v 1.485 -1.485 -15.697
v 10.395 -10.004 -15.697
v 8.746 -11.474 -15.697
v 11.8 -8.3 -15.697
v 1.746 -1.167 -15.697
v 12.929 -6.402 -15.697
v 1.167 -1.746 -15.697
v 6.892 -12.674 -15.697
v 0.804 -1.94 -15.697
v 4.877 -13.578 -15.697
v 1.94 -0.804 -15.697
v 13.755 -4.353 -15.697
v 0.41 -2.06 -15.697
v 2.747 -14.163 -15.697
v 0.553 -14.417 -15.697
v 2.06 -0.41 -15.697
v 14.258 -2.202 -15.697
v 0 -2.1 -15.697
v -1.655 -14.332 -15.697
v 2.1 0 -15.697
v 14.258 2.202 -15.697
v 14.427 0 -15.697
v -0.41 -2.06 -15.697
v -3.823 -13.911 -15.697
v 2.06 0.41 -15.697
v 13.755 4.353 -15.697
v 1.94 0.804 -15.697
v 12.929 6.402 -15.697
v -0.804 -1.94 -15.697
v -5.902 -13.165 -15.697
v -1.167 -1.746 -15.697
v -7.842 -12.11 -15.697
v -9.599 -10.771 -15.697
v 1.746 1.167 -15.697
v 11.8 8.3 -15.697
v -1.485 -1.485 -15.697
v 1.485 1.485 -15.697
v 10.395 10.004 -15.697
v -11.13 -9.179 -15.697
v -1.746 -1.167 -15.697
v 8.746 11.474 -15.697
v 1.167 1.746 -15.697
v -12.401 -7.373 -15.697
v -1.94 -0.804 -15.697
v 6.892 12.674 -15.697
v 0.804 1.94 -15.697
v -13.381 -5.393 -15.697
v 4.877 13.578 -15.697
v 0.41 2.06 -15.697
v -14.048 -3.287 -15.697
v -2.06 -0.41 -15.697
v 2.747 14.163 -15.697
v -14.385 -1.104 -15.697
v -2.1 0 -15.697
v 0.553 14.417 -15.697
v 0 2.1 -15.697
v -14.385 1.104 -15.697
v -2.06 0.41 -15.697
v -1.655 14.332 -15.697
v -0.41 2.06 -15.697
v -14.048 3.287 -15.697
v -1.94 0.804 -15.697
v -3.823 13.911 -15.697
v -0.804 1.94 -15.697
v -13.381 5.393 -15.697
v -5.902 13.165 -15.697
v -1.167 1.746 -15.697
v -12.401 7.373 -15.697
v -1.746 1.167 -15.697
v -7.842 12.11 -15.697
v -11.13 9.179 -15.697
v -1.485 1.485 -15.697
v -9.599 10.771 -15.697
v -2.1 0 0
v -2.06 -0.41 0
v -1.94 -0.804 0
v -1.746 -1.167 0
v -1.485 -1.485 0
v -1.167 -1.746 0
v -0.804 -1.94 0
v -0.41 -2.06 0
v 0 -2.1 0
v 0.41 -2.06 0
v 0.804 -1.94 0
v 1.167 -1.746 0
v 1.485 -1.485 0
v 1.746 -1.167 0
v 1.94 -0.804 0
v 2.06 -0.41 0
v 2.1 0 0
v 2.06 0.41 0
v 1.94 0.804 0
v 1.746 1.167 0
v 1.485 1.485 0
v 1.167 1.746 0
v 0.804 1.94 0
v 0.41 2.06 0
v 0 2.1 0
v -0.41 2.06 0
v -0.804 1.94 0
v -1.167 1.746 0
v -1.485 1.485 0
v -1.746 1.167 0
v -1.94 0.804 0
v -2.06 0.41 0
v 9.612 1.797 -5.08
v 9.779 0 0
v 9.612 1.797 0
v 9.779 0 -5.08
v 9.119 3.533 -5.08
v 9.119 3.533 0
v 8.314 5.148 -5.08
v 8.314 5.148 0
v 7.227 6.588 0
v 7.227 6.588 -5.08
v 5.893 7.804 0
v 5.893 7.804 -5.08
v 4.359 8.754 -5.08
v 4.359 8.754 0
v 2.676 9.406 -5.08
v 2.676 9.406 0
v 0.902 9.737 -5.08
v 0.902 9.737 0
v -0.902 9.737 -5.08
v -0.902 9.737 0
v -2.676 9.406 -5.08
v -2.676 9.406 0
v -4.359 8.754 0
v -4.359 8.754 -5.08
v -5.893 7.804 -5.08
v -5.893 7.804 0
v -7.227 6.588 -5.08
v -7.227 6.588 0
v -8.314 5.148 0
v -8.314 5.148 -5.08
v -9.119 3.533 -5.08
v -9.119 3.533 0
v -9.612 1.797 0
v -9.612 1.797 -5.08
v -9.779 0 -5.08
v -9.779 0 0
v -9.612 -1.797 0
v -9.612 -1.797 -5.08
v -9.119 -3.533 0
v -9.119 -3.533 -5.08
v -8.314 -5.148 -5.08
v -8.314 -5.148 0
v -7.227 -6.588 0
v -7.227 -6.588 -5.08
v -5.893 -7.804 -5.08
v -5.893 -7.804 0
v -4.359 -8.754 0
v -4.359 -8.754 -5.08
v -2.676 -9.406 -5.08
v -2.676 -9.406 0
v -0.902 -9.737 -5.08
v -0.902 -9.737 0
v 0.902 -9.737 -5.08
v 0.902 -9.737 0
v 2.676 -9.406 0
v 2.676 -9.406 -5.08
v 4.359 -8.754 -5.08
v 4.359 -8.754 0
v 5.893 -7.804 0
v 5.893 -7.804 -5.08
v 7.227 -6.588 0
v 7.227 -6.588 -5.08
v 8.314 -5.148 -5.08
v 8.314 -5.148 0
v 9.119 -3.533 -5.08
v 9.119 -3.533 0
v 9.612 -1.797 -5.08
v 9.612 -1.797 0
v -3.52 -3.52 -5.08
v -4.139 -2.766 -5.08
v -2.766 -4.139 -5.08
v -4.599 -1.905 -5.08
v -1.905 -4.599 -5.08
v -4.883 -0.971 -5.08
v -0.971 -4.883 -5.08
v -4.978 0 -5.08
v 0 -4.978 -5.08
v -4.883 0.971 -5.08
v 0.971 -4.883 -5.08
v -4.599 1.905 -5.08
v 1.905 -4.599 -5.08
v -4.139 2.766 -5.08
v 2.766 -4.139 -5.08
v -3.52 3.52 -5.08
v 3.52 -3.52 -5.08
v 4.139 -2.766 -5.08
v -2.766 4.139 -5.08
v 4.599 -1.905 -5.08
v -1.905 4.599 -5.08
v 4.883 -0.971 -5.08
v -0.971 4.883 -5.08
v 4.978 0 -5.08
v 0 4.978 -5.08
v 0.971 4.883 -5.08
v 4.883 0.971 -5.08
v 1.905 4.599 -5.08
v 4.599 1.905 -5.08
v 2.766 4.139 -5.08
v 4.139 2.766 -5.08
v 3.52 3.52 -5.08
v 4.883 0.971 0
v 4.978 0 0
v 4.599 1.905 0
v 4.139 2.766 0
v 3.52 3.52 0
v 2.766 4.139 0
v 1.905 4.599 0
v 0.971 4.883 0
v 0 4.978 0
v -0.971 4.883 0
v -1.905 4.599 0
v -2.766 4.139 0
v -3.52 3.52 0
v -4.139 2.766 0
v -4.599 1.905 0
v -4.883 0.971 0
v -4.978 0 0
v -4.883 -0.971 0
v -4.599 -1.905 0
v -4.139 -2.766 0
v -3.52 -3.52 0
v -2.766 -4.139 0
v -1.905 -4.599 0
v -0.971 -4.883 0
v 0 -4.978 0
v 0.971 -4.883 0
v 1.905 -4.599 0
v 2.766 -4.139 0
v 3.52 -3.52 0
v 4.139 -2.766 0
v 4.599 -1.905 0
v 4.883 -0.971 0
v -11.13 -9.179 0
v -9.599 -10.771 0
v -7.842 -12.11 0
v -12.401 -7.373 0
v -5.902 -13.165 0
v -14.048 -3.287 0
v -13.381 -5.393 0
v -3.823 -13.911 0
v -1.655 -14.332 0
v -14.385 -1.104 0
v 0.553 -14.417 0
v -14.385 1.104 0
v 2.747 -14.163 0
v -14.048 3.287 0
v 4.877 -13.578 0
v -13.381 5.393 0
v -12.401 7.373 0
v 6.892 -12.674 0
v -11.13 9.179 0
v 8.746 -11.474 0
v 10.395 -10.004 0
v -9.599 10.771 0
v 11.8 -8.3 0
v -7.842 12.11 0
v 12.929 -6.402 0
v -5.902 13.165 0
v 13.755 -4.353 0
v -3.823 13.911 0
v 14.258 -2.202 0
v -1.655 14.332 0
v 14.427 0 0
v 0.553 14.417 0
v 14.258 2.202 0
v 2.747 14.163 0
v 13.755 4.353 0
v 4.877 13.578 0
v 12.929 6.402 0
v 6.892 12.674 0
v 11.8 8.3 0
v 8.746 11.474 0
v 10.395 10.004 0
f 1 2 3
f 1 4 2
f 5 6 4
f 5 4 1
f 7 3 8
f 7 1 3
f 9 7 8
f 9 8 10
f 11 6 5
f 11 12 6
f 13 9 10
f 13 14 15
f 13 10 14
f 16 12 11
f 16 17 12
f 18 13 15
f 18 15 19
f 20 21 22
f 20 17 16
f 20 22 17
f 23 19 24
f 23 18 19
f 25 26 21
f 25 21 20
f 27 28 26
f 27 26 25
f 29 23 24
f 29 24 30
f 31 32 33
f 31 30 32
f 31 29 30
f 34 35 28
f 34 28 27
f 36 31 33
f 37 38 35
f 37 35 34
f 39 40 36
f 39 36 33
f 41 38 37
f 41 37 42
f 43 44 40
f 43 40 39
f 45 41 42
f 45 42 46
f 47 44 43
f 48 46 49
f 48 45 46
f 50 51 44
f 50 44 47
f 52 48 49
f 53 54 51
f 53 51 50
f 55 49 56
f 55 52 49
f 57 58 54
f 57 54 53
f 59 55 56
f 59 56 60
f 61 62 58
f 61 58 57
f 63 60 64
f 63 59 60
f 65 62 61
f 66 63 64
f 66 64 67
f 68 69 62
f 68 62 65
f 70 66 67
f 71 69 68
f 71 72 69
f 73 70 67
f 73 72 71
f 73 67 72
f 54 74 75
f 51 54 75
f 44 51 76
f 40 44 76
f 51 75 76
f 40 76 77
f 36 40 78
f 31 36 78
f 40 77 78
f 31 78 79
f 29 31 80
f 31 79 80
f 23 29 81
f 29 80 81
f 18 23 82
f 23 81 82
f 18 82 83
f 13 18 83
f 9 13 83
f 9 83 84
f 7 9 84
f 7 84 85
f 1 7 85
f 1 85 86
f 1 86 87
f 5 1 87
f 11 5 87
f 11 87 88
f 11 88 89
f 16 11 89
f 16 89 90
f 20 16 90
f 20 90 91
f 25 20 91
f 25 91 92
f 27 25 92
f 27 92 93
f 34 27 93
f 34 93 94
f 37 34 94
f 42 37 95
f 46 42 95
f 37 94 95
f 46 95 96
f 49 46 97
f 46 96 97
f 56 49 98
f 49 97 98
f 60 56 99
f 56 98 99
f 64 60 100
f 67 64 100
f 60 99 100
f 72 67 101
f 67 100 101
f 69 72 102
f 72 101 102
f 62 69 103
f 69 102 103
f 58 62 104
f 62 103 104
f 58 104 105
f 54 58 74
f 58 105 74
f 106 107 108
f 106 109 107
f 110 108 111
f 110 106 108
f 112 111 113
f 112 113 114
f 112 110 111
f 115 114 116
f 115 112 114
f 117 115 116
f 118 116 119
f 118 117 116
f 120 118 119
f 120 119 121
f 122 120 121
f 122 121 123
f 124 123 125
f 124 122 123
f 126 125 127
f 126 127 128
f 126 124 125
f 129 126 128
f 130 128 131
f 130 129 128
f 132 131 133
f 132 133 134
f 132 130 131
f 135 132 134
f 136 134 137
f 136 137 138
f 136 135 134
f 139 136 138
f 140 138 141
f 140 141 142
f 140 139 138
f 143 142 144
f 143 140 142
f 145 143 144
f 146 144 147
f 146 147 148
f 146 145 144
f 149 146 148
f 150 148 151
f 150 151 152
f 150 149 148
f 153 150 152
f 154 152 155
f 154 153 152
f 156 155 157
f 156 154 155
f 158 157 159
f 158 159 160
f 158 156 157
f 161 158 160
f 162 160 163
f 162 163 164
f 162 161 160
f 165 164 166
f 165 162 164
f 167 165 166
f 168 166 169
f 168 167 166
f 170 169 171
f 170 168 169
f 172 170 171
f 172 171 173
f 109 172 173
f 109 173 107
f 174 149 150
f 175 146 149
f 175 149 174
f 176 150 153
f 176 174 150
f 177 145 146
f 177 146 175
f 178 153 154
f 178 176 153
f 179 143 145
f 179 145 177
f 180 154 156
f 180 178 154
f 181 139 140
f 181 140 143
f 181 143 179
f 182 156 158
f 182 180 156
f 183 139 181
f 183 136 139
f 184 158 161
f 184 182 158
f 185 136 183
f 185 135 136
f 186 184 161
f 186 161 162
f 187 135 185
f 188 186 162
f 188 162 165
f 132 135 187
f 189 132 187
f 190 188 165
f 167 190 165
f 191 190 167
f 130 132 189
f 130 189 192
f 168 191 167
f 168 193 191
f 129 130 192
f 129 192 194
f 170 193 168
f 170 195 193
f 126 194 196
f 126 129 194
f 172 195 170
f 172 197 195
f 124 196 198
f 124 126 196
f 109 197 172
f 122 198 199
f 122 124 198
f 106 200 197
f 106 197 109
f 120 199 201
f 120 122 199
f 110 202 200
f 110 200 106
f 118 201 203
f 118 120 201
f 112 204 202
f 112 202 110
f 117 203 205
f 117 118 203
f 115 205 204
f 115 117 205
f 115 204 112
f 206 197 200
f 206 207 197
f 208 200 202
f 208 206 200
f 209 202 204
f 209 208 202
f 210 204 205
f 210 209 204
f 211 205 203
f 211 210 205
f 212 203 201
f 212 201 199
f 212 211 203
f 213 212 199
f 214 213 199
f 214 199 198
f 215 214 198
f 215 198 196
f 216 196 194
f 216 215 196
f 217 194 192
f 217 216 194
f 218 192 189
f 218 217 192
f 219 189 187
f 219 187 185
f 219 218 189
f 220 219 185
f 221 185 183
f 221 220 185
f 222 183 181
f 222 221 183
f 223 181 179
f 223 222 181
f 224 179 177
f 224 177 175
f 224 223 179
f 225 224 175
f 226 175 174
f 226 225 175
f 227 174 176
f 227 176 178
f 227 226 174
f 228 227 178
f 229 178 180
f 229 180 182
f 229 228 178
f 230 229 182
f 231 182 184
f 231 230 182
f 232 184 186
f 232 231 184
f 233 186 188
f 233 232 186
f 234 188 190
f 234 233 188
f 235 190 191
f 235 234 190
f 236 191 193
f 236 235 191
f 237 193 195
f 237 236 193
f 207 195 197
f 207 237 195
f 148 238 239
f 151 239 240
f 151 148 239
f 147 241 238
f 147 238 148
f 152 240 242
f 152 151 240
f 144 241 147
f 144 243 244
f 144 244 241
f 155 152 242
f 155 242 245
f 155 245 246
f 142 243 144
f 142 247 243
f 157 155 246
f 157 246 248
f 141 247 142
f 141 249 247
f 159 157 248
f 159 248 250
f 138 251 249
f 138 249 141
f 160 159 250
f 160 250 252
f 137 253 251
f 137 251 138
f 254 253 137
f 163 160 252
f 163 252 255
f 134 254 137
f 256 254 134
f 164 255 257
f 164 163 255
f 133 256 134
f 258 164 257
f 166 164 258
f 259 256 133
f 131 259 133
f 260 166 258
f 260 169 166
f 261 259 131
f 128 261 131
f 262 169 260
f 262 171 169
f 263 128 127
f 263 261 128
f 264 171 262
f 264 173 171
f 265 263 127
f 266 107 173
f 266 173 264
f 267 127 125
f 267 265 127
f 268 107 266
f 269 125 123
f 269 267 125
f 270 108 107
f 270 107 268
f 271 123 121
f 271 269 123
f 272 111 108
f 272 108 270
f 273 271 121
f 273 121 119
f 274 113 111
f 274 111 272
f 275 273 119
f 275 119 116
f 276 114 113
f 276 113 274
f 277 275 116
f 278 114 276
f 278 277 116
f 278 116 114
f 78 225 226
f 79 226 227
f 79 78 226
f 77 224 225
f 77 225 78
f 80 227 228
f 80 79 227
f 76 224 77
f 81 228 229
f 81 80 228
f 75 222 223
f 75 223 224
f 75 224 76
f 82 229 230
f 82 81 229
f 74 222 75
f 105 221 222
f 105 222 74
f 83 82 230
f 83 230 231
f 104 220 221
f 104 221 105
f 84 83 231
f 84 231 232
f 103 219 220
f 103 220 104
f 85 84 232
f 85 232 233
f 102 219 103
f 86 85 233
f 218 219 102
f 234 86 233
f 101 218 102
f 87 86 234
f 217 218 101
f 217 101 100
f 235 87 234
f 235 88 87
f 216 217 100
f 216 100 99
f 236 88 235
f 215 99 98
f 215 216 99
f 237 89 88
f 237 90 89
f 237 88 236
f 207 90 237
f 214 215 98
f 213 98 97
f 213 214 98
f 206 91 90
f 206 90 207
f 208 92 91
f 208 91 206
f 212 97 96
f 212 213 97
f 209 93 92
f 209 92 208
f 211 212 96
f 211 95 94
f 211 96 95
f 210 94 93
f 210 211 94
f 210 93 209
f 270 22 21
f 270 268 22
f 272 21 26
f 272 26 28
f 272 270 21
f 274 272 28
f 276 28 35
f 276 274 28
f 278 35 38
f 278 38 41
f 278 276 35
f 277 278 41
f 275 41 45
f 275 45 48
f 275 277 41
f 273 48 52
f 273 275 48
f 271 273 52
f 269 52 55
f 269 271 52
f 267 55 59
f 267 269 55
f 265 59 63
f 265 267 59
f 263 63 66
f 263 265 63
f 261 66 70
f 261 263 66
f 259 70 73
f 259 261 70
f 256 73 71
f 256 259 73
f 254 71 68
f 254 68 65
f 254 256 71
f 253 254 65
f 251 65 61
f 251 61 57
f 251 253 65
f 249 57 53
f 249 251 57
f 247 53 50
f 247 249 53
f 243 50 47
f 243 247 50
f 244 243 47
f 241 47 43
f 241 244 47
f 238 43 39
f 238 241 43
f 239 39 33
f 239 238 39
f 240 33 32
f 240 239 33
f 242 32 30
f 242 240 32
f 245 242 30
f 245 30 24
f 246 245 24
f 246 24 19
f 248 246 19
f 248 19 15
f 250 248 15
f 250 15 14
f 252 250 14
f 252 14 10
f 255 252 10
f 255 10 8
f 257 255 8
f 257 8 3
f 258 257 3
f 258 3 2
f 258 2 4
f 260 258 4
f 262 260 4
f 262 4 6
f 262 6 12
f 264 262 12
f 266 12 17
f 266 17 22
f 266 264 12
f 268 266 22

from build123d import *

# Parameters (mm, degrees)
F4_D     = 4.2
F4_DEPTH = 27.8
F4_TIP   = 1.2618073


# Not quite as in the source:
# - a feature of the source that left no trace in its solid (it failed there, or was rolled back) is left out


with BuildPart() as f1:
    # F0 (on Front) → F1 (revolve)
    with BuildSketch(Plane.XZ):
        Polygon((4.9784, 0), (0, 0), (0, -15.6972), (14.4272, -15.6972), (14.4272, 0), (9.779, 0), (9.779, -5.08), (4.9784, -5.08), align=None)
    revolve(axis=Axis((0, 0, -7.8486), (0, 0, 1)))

    # F4
    with Locations(Plane(origin=(0, 0, -15.6972), x_dir=(1, 0, 0), z_dir=(0, 0, -1))):
        with Locations((0, 0)):
            Hole(F4_D / 2, depth=F4_DEPTH)
            with Locations((0, 0, -(F4_DEPTH + F4_TIP / 2))):  # 118° drill point
                Cone(0, F4_D / 2, F4_TIP, mode=Mode.SUBTRACT)


solid = f1.part
